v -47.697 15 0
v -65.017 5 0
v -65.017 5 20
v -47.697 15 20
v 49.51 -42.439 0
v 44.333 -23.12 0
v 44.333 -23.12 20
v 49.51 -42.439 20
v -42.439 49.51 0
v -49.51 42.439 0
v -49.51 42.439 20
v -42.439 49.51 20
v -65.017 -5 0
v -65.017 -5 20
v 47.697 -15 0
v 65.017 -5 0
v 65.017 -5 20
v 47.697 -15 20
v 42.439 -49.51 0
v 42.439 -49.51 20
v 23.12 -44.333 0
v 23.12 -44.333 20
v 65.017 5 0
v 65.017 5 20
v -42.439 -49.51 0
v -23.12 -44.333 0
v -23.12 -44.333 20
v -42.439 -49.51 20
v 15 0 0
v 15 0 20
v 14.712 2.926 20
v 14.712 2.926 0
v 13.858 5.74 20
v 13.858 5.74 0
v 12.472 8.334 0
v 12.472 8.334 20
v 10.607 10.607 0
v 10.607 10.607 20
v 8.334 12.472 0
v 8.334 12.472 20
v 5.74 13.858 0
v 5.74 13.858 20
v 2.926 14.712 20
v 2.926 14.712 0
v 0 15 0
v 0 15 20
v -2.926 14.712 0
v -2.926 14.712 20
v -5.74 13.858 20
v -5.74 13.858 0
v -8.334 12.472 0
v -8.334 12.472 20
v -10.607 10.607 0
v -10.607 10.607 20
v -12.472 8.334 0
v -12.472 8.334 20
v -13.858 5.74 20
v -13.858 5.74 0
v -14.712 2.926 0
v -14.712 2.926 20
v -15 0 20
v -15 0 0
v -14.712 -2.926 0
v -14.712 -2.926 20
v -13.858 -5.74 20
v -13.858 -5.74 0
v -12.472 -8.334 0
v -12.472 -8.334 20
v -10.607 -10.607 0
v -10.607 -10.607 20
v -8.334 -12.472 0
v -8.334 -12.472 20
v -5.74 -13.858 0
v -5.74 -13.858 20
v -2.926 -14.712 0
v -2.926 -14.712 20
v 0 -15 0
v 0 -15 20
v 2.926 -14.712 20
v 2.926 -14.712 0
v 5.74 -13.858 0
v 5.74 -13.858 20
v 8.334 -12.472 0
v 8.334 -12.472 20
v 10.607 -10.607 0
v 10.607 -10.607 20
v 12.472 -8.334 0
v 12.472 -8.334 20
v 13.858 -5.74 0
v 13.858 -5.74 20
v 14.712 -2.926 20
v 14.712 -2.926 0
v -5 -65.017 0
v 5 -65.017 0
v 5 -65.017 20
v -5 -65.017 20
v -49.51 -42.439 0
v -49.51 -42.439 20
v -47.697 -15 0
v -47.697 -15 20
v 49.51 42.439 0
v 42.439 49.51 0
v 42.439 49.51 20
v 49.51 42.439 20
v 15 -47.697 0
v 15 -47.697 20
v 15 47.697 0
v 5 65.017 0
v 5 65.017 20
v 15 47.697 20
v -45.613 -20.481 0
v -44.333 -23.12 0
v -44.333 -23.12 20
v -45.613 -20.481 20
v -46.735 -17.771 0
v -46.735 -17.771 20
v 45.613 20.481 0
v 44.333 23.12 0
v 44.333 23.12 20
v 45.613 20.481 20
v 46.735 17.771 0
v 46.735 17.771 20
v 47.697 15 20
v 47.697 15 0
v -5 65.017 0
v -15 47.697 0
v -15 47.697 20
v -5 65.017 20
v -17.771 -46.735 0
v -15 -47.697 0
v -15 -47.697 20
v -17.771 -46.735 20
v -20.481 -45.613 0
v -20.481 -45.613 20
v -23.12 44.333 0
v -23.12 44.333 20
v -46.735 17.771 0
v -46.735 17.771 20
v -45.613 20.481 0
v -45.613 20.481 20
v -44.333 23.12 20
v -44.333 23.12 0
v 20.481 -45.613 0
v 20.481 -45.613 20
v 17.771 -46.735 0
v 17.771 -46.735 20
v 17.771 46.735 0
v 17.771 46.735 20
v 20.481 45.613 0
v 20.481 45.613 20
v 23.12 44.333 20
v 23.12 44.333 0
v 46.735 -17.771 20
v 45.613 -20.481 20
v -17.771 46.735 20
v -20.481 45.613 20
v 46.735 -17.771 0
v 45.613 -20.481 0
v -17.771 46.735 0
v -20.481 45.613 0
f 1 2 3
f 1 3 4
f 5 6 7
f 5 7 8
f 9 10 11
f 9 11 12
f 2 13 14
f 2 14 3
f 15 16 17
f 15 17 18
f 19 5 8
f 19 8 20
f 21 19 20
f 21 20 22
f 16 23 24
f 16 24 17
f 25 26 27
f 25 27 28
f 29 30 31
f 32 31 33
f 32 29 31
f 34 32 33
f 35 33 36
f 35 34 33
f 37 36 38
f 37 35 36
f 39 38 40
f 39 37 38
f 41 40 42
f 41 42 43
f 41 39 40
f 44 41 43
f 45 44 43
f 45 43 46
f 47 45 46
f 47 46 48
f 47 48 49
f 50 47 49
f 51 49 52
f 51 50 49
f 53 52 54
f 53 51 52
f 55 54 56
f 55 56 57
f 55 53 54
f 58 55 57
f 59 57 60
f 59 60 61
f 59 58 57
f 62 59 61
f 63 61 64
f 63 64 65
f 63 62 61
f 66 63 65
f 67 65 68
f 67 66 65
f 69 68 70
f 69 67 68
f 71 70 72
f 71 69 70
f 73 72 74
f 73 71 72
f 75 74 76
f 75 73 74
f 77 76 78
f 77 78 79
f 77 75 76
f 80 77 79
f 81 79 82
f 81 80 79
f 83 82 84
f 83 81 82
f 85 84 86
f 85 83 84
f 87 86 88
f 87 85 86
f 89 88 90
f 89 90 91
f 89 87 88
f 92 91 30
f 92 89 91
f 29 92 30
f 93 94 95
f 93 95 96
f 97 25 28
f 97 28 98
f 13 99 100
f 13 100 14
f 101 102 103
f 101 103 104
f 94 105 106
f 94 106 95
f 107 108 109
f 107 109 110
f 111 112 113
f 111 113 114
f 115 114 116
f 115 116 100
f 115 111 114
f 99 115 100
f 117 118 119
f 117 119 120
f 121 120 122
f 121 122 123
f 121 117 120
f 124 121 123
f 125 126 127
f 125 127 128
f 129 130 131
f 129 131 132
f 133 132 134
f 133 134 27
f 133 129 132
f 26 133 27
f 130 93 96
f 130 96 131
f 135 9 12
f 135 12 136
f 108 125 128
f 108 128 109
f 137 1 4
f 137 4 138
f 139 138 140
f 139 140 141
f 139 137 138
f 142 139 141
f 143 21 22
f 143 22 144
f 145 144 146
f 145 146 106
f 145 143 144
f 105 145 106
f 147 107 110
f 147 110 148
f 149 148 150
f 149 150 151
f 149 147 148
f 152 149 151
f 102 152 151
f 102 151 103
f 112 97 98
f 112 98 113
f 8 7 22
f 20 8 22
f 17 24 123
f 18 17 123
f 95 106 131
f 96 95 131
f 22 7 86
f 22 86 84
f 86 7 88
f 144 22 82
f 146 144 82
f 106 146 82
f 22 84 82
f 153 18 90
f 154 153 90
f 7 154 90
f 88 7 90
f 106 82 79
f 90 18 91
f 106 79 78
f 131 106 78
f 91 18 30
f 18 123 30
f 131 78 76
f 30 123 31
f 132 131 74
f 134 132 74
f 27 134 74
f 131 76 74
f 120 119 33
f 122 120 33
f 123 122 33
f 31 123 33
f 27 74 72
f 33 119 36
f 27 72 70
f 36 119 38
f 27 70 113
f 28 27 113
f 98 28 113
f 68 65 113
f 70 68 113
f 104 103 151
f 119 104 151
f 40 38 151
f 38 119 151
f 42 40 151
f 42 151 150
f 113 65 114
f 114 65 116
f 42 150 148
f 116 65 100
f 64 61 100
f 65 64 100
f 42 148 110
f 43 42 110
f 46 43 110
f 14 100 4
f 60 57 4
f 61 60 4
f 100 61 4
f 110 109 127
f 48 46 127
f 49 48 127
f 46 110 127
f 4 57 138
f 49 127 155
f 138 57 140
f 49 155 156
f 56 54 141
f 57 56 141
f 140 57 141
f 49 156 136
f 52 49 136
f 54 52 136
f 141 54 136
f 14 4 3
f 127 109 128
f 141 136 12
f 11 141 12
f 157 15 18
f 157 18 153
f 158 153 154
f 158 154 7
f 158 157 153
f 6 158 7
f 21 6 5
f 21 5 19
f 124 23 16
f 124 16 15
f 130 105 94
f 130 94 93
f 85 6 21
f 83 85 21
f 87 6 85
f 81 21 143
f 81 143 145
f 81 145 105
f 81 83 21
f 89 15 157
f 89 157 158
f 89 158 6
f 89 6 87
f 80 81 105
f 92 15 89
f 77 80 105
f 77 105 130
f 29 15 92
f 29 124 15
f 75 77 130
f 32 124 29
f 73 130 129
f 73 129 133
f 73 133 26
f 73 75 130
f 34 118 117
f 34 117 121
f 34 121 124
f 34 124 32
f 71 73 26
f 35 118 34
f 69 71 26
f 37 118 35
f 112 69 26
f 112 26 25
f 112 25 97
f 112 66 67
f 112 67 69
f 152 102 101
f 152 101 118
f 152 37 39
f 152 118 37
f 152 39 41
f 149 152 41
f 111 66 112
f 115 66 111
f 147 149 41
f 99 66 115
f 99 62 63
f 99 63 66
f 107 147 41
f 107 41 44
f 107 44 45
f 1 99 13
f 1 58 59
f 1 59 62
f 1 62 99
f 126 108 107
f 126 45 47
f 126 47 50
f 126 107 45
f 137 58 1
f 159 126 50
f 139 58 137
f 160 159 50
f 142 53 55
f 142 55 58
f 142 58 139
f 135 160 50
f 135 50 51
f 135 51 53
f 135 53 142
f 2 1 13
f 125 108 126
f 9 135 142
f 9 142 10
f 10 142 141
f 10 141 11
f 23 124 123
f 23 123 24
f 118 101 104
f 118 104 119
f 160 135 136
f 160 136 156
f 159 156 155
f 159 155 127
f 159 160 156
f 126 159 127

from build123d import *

# Parameters (mm, degrees)
SZKIC1_R                    = 15
DODANIE_WYCI_GNI_CIE1_DEPTH = 20


with BuildPart() as part:
    # Szkic1 → Dodanie-wyciągnięcie1 (new body)
    with BuildSketch(Plane.XY):
        with BuildLine():
            Line((-5, 65.017468147), (5, 65.017468147))
            Line((5, 65.017468147), (15, 47.696960071))
            ThreePointArc((15, 47.696960071), (19.134171618, 46.193976626), (23.12024219, 44.333445626))
            Line((23.12024219, 44.333445626), (42.438758716, 49.509826528))
            Line((42.438758716, 49.509826528), (49.509826528, 42.438758716))
            Line((49.509826528, 42.438758716), (44.333445626, 23.12024219))
            ThreePointArc((44.333445626, 23.12024219), (46.193976626, 19.134171618), (47.696960071, 15))
            Line((47.696960071, 15), (65.017468147, 5))
            Line((65.017468147, 5), (65.017468147, -5))
            Line((65.017468147, -5), (47.696960071, -15))
            ThreePointArc((47.696960071, -15), (46.193976626, -19.134171618), (44.333445626, -23.12024219))
            Line((44.333445626, -23.12024219), (49.509826528, -42.438758716))
            Line((49.509826528, -42.438758716), (42.438758716, -49.509826528))
            Line((42.438758716, -49.509826528), (23.12024219, -44.333445626))
            ThreePointArc((23.12024219, -44.333445626), (19.134171618, -46.193976626), (15, -47.696960071))
            Line((15, -47.696960071), (5, -65.017468147))
            Line((5, -65.017468147), (-5, -65.017468147))
            Line((-5, -65.017468147), (-15, -47.696960071))
            ThreePointArc((-15, -47.696960071), (-19.134171618, -46.193976626), (-23.12024219, -44.333445626))
            Line((-23.12024219, -44.333445626), (-42.438758716, -49.509826528))
            Line((-42.438758716, -49.509826528), (-49.509826528, -42.438758716))
            Line((-49.509826528, -42.438758716), (-44.333445626, -23.12024219))
            ThreePointArc((-44.333445626, -23.12024219), (-46.193976626, -19.134171618), (-47.696960071, -15))
            Line((-47.696960071, -15), (-65.017468147, -5))
            Line((-65.017468147, -5), (-65.017468147, 5))
            Line((-65.017468147, 5), (-47.696960071, 15))
            ThreePointArc((-47.696960071, 15), (-46.193976626, 19.134171618), (-44.333445626, 23.12024219))
            Line((-44.333445626, 23.12024219), (-49.509826528, 42.438758716))
            Line((-49.509826528, 42.438758716), (-42.438758716, 49.509826528))
            Line((-42.438758716, 49.509826528), (-23.12024219, 44.333445626))
            ThreePointArc((-23.12024219, 44.333445626), (-19.134171618, 46.193976626), (-15, 47.696960071))
            Line((-15, 47.696960071), (-5, 65.017468147))
        make_face()
        Circle(SZKIC1_R, mode=Mode.SUBTRACT)
    extrude(amount=DODANIE_WYCI_GNI_CIE1_DEPTH)


solid = part.part
